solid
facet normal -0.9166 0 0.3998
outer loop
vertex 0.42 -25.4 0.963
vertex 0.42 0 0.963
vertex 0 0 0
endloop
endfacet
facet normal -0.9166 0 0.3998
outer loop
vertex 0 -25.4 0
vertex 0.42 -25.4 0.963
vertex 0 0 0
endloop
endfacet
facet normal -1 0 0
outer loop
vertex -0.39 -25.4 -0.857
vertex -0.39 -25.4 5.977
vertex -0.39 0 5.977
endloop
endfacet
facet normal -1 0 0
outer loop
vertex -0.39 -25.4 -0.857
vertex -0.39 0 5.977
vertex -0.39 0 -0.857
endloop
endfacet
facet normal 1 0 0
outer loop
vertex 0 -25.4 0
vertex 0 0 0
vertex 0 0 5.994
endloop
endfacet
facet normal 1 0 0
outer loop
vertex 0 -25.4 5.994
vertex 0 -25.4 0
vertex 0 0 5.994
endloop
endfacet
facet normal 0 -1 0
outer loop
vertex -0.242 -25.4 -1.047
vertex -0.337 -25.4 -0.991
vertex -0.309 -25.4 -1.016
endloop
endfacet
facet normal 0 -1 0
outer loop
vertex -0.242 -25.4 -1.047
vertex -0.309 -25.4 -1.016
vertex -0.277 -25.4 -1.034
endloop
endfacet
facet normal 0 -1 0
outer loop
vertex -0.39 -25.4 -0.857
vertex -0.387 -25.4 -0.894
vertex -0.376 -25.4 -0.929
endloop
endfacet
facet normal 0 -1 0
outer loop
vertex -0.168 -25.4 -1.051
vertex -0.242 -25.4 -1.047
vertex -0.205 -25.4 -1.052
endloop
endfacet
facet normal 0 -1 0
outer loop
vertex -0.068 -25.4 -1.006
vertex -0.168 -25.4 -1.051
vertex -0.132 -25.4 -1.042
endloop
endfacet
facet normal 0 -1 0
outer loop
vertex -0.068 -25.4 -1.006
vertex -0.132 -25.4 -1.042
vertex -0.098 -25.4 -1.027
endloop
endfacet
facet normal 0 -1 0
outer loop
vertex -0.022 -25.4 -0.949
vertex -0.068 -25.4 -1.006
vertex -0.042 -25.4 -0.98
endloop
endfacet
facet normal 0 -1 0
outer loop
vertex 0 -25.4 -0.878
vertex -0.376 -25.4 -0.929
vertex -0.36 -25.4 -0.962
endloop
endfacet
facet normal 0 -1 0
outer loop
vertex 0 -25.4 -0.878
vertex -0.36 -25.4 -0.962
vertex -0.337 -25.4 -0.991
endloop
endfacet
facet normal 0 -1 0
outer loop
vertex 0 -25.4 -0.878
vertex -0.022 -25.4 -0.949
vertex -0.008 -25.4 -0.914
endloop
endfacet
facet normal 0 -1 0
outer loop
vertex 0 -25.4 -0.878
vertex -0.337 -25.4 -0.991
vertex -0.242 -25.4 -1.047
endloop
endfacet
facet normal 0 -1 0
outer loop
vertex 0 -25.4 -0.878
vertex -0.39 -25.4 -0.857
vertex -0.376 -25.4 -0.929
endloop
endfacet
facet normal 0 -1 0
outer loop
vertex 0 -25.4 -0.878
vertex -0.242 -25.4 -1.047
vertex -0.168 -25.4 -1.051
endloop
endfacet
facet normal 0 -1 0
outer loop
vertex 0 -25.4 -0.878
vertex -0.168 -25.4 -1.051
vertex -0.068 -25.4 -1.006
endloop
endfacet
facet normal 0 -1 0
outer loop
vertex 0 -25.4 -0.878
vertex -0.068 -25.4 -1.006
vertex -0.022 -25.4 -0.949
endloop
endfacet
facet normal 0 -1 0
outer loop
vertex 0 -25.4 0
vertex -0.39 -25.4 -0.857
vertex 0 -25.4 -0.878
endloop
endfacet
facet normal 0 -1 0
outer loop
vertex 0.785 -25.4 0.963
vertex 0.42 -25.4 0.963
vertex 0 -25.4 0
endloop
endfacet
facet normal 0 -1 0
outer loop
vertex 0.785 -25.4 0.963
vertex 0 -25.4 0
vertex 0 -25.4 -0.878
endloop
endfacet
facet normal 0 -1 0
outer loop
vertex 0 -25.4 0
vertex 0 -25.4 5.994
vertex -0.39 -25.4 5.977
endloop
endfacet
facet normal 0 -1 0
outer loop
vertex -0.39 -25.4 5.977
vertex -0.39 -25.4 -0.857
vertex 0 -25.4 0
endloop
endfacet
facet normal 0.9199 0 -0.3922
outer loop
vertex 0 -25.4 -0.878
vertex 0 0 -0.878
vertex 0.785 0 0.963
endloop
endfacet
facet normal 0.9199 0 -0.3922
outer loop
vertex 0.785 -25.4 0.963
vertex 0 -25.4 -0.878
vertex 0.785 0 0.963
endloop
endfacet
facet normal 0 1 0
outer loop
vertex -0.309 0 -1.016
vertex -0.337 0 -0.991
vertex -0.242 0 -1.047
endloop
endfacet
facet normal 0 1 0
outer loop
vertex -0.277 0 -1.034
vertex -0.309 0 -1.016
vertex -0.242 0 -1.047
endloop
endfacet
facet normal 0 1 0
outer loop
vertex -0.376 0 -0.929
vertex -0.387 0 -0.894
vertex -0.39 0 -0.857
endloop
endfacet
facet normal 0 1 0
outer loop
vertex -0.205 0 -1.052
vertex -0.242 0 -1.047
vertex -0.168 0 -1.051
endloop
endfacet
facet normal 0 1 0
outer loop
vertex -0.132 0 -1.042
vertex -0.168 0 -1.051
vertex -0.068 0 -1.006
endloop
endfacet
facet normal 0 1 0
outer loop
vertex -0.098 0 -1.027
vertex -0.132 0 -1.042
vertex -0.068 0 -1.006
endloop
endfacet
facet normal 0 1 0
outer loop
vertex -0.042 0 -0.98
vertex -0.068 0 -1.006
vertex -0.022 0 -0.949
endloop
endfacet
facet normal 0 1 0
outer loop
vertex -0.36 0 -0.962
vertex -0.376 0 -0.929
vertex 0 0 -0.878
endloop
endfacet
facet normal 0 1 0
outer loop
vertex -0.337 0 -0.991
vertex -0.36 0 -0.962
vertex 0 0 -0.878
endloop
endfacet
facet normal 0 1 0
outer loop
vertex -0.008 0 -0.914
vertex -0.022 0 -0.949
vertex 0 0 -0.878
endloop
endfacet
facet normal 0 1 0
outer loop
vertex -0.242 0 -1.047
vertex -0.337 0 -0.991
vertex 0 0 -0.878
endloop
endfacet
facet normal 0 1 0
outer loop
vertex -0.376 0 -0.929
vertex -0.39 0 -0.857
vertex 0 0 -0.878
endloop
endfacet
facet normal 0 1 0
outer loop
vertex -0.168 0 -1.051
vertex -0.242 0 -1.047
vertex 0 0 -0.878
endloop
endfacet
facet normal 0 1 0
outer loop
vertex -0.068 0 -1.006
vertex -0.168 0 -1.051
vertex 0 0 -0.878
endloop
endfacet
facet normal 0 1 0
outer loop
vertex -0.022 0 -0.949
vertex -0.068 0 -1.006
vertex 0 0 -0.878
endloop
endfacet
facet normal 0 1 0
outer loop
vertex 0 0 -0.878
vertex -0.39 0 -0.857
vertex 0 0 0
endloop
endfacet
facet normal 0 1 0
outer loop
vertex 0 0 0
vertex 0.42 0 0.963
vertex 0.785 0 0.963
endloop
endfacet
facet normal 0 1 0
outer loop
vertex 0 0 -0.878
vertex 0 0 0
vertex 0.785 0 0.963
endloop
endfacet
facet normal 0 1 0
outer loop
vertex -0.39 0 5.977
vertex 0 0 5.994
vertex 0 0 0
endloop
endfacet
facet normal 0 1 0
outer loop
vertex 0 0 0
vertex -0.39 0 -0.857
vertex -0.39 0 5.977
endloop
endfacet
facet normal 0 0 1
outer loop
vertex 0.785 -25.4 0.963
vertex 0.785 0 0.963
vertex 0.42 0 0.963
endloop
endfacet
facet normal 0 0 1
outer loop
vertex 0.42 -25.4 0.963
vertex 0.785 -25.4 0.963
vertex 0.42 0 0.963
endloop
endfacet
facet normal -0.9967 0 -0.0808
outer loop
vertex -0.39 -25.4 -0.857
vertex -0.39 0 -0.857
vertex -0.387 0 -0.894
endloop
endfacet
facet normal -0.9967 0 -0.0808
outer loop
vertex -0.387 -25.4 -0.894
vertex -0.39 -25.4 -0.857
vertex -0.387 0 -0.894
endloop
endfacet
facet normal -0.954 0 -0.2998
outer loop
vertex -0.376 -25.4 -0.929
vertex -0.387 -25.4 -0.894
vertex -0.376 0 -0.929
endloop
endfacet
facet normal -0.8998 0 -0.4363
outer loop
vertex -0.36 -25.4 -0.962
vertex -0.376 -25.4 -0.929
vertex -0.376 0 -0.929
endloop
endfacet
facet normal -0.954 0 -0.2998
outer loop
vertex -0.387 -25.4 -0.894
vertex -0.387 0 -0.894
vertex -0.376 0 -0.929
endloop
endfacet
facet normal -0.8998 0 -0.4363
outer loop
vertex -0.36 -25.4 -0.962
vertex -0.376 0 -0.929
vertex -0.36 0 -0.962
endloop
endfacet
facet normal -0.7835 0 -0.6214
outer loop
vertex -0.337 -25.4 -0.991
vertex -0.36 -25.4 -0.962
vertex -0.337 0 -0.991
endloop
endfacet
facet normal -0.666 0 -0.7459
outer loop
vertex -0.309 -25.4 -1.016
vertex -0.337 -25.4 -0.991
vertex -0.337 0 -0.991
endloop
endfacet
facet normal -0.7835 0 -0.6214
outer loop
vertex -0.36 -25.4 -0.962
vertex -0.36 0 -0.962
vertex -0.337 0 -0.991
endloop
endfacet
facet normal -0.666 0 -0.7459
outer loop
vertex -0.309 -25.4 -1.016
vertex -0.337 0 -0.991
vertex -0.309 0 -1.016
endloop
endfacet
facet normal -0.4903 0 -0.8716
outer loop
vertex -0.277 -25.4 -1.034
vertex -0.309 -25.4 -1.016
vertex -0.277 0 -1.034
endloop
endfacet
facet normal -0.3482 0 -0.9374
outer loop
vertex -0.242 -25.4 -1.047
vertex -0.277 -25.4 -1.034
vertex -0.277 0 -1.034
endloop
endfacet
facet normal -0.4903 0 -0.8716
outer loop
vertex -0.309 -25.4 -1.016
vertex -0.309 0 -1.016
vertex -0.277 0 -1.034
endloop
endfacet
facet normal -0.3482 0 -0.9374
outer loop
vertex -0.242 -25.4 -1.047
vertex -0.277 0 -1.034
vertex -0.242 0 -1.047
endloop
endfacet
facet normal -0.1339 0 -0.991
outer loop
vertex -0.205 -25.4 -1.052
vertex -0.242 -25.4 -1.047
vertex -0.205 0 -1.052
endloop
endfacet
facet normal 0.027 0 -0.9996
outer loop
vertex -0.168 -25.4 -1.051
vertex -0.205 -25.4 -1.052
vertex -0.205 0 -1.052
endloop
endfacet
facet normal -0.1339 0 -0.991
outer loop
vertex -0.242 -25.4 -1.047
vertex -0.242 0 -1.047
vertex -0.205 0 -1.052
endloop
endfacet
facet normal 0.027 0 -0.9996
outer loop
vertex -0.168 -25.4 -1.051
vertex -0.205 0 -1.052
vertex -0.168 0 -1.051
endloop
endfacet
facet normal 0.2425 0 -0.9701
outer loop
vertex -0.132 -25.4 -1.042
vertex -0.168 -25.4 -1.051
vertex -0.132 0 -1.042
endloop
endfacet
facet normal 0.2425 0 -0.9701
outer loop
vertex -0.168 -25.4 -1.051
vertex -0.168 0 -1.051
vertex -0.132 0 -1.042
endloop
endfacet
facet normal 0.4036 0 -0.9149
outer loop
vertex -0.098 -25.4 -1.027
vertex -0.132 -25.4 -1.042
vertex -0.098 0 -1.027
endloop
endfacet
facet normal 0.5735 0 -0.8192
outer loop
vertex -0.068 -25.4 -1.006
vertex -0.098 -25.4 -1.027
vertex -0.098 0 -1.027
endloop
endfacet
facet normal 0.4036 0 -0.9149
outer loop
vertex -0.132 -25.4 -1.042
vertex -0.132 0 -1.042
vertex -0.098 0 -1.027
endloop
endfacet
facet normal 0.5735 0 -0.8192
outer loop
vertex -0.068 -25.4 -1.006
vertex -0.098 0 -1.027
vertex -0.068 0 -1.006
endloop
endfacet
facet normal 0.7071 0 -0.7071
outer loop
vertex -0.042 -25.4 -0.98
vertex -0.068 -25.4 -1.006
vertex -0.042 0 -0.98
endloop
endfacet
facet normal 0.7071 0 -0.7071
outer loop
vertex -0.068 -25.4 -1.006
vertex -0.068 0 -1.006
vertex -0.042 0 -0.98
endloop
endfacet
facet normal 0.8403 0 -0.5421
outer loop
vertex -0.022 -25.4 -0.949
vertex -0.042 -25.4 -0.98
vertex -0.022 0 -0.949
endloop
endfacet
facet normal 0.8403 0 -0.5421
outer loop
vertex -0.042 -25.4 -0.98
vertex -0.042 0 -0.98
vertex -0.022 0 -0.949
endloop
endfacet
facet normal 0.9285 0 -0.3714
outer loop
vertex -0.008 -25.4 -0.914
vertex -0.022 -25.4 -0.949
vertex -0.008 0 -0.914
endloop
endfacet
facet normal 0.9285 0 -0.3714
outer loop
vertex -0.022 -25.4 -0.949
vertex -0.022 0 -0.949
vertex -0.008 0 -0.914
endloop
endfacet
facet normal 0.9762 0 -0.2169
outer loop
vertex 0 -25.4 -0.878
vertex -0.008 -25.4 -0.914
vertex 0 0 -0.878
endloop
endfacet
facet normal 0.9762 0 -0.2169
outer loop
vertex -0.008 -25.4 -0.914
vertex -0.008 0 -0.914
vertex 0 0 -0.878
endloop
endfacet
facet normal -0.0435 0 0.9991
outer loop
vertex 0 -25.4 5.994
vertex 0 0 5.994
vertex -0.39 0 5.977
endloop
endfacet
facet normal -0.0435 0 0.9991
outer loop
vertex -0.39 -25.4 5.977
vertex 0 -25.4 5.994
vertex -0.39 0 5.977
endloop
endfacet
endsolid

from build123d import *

# Parameters (mm, degrees)
F1_DEPTH = 25.4


with BuildPart() as f1:
    # F0 (on Front) → F1 (new body)
    with BuildSketch(Plane.XZ):
        with BuildLine():
            Line((0, 0), (0, 5.9944))
            Line((0, 5.9944), (-0.390362, 5.977479))
            Line((-0.390362, 5.977479), (-0.390362, -0.856854))
            ThreePointArc((-0.390362, -0.856854), (-0.205291, -1.052327), (0, -0.878212))
            Line((0, -0.878212), (0.784725, 0.96267))
            Line((0.784725, 0.96267), (0.420264, 0.96267))
            Line((0.420264, 0.96267), (0, 0))
        make_face()
    extrude(amount=F1_DEPTH)


solid = f1.part
